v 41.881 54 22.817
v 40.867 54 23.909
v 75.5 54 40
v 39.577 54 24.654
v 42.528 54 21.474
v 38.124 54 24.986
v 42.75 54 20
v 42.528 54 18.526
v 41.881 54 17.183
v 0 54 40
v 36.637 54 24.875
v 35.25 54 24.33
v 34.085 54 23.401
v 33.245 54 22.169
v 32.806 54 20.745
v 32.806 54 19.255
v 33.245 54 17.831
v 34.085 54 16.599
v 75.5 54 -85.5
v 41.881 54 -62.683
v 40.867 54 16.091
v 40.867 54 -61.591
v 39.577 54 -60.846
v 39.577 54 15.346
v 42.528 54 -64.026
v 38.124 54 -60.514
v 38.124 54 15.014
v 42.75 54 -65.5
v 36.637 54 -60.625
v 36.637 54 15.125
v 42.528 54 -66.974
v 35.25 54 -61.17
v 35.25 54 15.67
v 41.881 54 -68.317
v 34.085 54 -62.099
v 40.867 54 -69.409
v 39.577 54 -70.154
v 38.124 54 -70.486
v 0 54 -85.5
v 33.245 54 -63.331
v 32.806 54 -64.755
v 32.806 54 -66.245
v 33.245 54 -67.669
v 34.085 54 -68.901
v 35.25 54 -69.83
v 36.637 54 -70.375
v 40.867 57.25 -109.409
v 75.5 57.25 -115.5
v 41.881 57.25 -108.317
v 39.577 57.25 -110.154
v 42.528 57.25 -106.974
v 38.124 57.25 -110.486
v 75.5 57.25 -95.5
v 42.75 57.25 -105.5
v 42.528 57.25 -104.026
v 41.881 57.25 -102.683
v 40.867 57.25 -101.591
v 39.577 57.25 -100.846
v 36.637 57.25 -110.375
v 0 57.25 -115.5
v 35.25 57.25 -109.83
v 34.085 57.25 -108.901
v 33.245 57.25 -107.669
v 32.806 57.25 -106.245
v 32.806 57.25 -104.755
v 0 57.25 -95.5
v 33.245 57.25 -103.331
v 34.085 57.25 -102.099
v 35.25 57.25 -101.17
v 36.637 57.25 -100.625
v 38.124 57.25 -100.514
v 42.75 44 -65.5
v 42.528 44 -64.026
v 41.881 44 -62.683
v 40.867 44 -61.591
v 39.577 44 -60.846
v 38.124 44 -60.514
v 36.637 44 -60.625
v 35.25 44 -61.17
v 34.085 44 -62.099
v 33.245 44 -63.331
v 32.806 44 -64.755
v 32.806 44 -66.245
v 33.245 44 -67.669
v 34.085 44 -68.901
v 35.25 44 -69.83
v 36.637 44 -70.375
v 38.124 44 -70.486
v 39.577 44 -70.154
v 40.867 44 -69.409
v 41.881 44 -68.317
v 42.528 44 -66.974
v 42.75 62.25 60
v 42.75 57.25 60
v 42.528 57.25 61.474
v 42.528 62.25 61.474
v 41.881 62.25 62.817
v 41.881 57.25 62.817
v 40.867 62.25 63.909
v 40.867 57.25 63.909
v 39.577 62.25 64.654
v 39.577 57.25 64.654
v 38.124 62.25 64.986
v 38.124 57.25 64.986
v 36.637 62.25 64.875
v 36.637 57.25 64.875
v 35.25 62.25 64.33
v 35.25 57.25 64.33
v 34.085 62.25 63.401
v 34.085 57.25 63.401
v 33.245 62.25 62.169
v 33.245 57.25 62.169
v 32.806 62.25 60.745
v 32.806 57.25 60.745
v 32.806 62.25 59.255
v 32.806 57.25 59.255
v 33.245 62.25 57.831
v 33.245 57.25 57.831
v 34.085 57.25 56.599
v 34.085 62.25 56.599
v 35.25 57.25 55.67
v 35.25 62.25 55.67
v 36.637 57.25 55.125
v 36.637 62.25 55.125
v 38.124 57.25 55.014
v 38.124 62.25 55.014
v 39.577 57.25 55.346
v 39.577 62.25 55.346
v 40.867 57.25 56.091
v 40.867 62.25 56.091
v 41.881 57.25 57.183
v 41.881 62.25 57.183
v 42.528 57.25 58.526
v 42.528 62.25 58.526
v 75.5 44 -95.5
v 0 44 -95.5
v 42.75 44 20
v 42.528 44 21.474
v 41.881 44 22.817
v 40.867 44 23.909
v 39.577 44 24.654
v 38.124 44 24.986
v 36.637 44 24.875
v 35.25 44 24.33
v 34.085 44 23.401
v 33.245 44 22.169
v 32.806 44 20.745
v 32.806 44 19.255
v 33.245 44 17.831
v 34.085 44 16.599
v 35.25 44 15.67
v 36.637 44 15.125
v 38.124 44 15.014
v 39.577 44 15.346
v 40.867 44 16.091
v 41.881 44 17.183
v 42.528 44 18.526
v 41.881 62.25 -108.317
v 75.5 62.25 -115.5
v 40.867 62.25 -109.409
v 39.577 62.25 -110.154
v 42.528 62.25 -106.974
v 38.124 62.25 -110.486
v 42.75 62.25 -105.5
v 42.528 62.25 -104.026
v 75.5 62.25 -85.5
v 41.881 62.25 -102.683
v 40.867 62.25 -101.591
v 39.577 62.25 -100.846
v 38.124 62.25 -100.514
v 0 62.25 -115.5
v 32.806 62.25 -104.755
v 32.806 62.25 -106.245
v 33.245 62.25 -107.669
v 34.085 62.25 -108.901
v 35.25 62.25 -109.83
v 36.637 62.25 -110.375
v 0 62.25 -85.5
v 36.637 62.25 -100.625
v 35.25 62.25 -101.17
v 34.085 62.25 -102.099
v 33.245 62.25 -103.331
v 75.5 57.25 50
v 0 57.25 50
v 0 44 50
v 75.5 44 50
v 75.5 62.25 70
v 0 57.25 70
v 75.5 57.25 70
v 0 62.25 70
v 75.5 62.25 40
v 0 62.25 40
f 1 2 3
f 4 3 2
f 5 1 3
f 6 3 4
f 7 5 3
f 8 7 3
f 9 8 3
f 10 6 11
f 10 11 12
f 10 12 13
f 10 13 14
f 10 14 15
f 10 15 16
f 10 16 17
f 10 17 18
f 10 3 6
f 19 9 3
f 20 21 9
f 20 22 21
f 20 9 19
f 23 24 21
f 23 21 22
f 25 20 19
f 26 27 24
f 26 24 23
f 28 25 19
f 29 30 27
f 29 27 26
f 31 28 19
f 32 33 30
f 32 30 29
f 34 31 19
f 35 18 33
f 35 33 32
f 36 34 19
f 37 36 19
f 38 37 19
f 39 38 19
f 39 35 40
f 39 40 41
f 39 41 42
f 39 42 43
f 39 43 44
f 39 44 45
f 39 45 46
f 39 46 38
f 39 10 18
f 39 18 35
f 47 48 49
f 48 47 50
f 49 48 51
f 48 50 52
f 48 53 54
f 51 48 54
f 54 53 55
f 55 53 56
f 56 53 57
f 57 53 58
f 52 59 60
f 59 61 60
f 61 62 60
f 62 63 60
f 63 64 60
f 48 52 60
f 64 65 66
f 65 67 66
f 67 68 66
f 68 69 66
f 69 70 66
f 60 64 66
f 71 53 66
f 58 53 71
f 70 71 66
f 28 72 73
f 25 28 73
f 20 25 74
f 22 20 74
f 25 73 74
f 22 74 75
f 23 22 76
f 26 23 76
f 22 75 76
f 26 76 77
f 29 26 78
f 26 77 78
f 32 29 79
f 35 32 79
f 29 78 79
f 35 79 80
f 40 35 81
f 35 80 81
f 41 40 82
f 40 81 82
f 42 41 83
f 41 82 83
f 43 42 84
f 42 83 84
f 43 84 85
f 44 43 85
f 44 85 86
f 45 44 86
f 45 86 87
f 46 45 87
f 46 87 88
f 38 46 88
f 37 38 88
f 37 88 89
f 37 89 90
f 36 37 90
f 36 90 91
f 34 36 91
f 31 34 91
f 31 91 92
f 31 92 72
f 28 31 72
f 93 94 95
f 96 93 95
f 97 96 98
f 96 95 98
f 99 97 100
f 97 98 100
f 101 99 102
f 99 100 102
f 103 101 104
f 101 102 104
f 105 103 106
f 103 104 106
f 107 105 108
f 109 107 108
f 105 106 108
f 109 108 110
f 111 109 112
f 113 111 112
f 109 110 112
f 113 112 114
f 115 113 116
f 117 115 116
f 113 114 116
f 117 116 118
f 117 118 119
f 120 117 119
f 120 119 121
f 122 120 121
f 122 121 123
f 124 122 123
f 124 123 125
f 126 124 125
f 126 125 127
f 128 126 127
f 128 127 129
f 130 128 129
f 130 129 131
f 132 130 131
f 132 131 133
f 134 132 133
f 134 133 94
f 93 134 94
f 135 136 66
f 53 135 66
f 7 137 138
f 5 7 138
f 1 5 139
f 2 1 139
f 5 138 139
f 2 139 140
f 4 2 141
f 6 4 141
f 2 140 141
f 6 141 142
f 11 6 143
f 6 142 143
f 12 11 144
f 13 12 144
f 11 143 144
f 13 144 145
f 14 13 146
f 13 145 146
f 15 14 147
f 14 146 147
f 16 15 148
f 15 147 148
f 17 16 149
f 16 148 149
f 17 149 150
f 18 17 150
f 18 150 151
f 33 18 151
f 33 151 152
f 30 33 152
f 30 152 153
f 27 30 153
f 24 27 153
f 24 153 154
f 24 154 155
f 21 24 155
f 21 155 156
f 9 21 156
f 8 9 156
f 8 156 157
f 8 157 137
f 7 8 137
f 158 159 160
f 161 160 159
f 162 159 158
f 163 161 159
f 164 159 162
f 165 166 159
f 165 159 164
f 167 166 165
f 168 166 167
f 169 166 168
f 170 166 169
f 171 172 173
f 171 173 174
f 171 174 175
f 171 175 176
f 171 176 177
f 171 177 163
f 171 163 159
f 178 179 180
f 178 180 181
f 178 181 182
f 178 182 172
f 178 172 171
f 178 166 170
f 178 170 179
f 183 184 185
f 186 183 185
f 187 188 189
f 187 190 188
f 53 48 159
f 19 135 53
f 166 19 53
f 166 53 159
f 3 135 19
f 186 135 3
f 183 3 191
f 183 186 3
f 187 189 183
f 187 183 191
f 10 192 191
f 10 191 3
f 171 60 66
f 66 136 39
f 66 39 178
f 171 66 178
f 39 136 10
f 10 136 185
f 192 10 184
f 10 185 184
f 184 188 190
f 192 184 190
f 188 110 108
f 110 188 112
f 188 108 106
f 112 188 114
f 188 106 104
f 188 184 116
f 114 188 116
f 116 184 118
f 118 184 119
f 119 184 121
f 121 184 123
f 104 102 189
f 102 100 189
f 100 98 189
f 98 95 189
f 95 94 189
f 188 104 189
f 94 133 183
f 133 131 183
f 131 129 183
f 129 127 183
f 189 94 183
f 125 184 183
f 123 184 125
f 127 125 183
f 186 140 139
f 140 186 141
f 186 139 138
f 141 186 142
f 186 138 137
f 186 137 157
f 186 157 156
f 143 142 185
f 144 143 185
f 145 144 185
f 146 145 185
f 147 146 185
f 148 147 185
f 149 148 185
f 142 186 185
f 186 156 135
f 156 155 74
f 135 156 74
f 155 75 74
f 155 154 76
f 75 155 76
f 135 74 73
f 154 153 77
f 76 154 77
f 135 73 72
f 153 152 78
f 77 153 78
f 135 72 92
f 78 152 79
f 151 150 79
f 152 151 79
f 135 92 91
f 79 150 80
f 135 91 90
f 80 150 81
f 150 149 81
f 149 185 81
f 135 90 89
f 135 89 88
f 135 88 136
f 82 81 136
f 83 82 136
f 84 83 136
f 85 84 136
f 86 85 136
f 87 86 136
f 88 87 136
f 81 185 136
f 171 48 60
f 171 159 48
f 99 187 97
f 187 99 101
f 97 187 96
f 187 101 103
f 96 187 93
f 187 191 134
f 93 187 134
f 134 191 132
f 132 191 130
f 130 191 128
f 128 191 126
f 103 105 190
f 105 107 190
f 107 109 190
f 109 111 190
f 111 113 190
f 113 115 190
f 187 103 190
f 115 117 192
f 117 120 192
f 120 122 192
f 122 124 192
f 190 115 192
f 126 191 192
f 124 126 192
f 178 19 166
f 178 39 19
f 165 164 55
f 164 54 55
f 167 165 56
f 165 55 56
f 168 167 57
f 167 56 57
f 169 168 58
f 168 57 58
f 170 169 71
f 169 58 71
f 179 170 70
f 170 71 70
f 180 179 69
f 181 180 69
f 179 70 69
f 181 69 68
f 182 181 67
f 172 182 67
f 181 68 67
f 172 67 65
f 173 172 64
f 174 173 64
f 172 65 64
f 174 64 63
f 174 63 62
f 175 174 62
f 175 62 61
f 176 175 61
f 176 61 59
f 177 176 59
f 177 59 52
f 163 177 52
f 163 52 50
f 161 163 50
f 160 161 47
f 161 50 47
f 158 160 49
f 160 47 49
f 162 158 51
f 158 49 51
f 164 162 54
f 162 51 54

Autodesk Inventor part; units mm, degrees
ref_plane "YZ Plane" through (0, 0, 0) normal (1, 0, 0) x (0, 1, 0)
ref_plane "XZ Plane" through (0, 0, 0) normal (0, 1, 0) x (-1, 0, 0)
ref_plane "XY Plane" through (0, 0, 0) normal (0, 0, 1) x (1, 0, 0)
sketch "Sketch1" plane through (0, 0, 0) normal (1, 0, 0) x (0, 1, 0)
  line L0 (-6, -12.5) -> (-6, -12.9)
  arc A0 (-6, -12.9) -> (-5.6, -13.3) centre (-5.6, -12.9) ccw
  line L1 (-5.6, -13.3) -> (-4.9, -13.3)
  arc A1 (-4.9, -13.3) -> (-4.7, -13.1) centre (-4.9, -13.1) ccw
  line L2 (-4.7, -13.1) -> (-4.7, -12.85)
  arc A2 (-4.5, -12.65) -> (-4.7, -12.85) centre (-4.5, -12.85) ccw
  line L3 (-4.5, -12.65) -> (-1.8, -12.65)
  arc A3 (-1.4, -13.05) -> (-1.8, -12.65) centre (-1.8, -13.05) ccw
  line L4 (-1.4, -13.05) -> (-1.4, -18.75)
  line L5 (-1.8, -19.15) -> (-4.5, -19.15)
  arc A4 (-1.8, -19.15) -> (-1.4, -18.75) centre (-1.8, -18.75) ccw
  arc A5 (-4.7, -18.95) -> (-4.5, -19.15) centre (-4.5, -18.95) ccw
  line L6 (-4.7, -18.95) -> (-4.7, -18.7)
  arc A6 (-4.7, -18.7) -> (-4.9, -18.5) centre (-4.9, -18.7) ccw
  line L7 (-4.9, -18.5) -> (-5.6, -18.5)
  arc A7 (-5.6, -18.5) -> (-6, -18.9) centre (-5.6, -18.9) ccw
  line L8 (-6, -18.9) -> (-6, -19.5)
  line L9 (-6.5, -6.5) -> (-6.5, -12.5)
  line L10 (-6.5, -12.5) -> (-2.5, -12.5)
  line L11 (-1.05, -19.5) -> (-6.5, -19.5)
  line L12 (-6.5, -19.5) -> (-6.5, -26)
  line L13 (-6.5, -26) -> (-1.05, -26)
  line L14 (-6, -26) -> (-6, -26.6)
  arc A8 (-6, -26.6) -> (-5.6, -27) centre (-5.6, -26.6) ccw
  line L15 (-5.6, -27) -> (-4.9, -27)
  arc A9 (-4.9, -27) -> (-4.7, -26.8) centre (-4.9, -26.8) ccw
  arc A10 (-4.5, -26.35) -> (-4.7, -26.55) centre (-4.5, -26.55) ccw
  line L16 (-4.7, -26.8) -> (-4.7, -26.55)
  line L17 (-4.5, -26.35) -> (-1.8, -26.35)
  arc A11 (-1.4, -26.75) -> (-1.8, -26.35) centre (-1.8, -26.75) ccw
  line L18 (-1.4, -26.75) -> (-1.4, -32.45)
  arc A12 (-1.8, -32.85) -> (-1.4, -32.45) centre (-1.8, -32.45) ccw
  line L19 (-1.8, -32.85) -> (-4.5, -32.85)
  arc A13 (-4.7, -32.65) -> (-4.5, -32.85) centre (-4.5, -32.65) ccw
  line L20 (-4.7, -32.65) -> (-4.7, -32.4)
  arc A14 (-4.7, -32.4) -> (-4.9, -32.2) centre (-4.9, -32.4) ccw
  line L21 (-4.9, -32.2) -> (-5.6, -32.2)
  arc A15 (-5.6, -32.2) -> (-6, -32.6) centre (-5.6, -32.6) ccw
  line L22 (-6, -32.6) -> (-6, -33)
  line L23 (-2.5, -33) -> (-6.5, -33)
  line L24 (-6.5, -33) -> (-6.5, -39)
  line L25 (32.5, 0) -> (0, 0)
  circle A16 centre (0, -6.5) radius 4.75
  circle A17 centre (32.5, -6.5) radius 4.75
  circle A18 centre (0, -39) radius 4.75
  circle A19 centre (32.5, -39) radius 4.75
  line L26 (39, -26) -> (39, -19.5)
  line L27 (39, -12.5) -> (39, -6.5)
  line L28 (39, -39) -> (39, -33)
  line L29 (26.5, -45.5) -> (32.5, -45.5)
  line L30 (0, -45.5) -> (6, -45.5)
  line L31 (13, -45.5) -> (19.5, -45.5)
  circle A20 centre (16.25, -22.75) radius 15
  circle A21 centre (16.2588, 5.0016) radius 2.5
  circle A22 centre (16.25, -50.5) radius 2.5
  circle A23 centre (16.25, -22.75) radius 5
  circle A24 centre (16.25, -22.75) radius 8.45
  line L32 (24.75, -27.6575) -> (24.75, -17.8425)
  line L33 (44, 10) -> (-11.5, 10)
  line L34 (-11.5, 10) -> (-11.5, -55.5)
  line L35 (-11.5, -55.5) -> (44, -55.5)
  line L36 (44, -55.5) -> (44, 10)
  line L37 (-11.5, 30) -> (44, 30)
  line L38 (-11.5, -75.5) -> (-11.5, 30)
  line L39 (44, 30) -> (44, -75.5)
  line L40 (44, -75.5) -> (-11.5, -75.5)
  circle A25 centre (16.25, -65.5) radius 5
  circle A26 centre (16.25, 20) radius 5
  line L41 (44, 30) -> (44, 50)
  line L42 (44, -75.5) -> (44, -95.5)
  line L43 (110, 50) -> (84, 50)
  line L44 (84, 50) -> (84, -95.5)
  line L45 (84, -95.5) -> (110, -95.5)
  line L46 (110, -95.5) -> (110, 50)
  line L47 (84, 50) -> (104, 50)
  line L48 (104, -95.5) -> (84, -95.5)
  line L49 (84, -95.5) -> (84, 50)
  line L50 (84, 50) -> (64, 50)
  line L51 (64, 50) -> (64, -95.5)
  line L52 (64, -95.5) -> (84, -95.5)
  line L53 (84, -95.5) -> (84, 50)
  line L54 (64, 50) -> (44, 50)
  line L55 (44, 50) -> (44, -95.5)
  line L56 (44, -95.5) -> (64, -95.5)
  line L57 (64, -95.5) -> (64, 50)
  line L58 (44, 30) -> (54, 30)
  line L59 (100.8097, 50) -> (100.8097, 40)
  line L60 (94, -95.5) -> (94, -85.5)
  line L61 (110, 40) -> (54, 40)
  line L62 (54, 40) -> (54, -85.5)
  line L63 (54, -85.5) -> (110, -85.5)
  line L64 (110, 50) -> (136, 50)
  line L65 (136, 50) -> (136, 40)
  line L66 (136, 40) -> (110, 40)
  line L67 (110, -85.5) -> (136, -85.5)
  line L68 (136, -85.5) -> (136, -95.5)
  line L69 (136, -95.5) -> (110, -95.5)
  dimension "d0" = 20
  dimension "d1" = 20
  dimension "d2" = 55.5
  dimension "d3" = 26
  dimension "d5" = 20
  dimension "d6" = 45.5
  dimension "d7" = 20
  dimension "d8" = 10
  dimension "d9" = 10
  dimension "d10" = 26
extrude "Extrusion1" add sketch "Sketch1" along normal blind 75.5 contours L39 L58 L62 L63 L51 L56 L42 L36 | L41 L54 L51 L61 L62 L58 | L50 L44 L61 L51 | L51 L63 L44 L52 | L43 L59 L61 L44 | L44 L63 L60 L45 | L43 L46 L61 L59 | L60 L63 L46 L45 | L64 L65 L66 L46 | L67 L68 L69 L46
sketch "Sketch2" plane through (0, 44, -95.5) normal (0, -1, 0) x (1, 0, 0)
  line L0 (15.5, 83) -> (15.5, 82.6)
  arc A0 (15.5, 82.6) -> (15.9, 82.2) centre (15.9, 82.6) ccw
  line L1 (15.9, 82.2) -> (16.6, 82.2)
  arc A1 (16.6, 82.2) -> (16.8, 82.4) centre (16.6, 82.4) ccw
  line L2 (16.8, 82.4) -> (16.8, 82.65)
  arc A2 (17, 82.85) -> (16.8, 82.65) centre (17, 82.65) ccw
  line L3 (17, 82.85) -> (19.7, 82.85)
  arc A3 (20.1, 82.45) -> (19.7, 82.85) centre (19.7, 82.45) ccw
  line L4 (20.1, 82.45) -> (20.1, 76.75)
  line L5 (19.7, 76.35) -> (17, 76.35)
  arc A4 (19.7, 76.35) -> (20.1, 76.75) centre (19.7, 76.75) ccw
  arc A5 (16.8, 76.55) -> (17, 76.35) centre (17, 76.55) ccw
  line L6 (16.8, 76.55) -> (16.8, 76.8)
  arc A6 (16.8, 76.8) -> (16.6, 77) centre (16.6, 76.8) ccw
  line L7 (16.6, 77) -> (15.9, 77)
  arc A7 (15.9, 77) -> (15.5, 76.6) centre (15.9, 76.6) ccw
  line L8 (15.5, 76.6) -> (15.5, 76)
  line L9 (15, 89) -> (15, 83)
  line L10 (15, 83) -> (19, 83)
  line L11 (20.45, 76) -> (15, 76)
  line L12 (15, 76) -> (15, 69.5)
  line L13 (15, 69.5) -> (20.45, 69.5)
  line L14 (15.5, 69.5) -> (15.5, 68.9)
  arc A8 (15.5, 68.9) -> (15.9, 68.5) centre (15.9, 68.9) ccw
  line L15 (15.9, 68.5) -> (16.6, 68.5)
  arc A9 (16.6, 68.5) -> (16.8, 68.7) centre (16.6, 68.7) ccw
  arc A10 (17, 69.15) -> (16.8, 68.95) centre (17, 68.95) ccw
  line L16 (16.8, 68.7) -> (16.8, 68.95)
  line L17 (17, 69.15) -> (19.7, 69.15)
  arc A11 (20.1, 68.75) -> (19.7, 69.15) centre (19.7, 68.75) ccw
  line L18 (20.1, 68.75) -> (20.1, 63.05)
  arc A12 (19.7, 62.65) -> (20.1, 63.05) centre (19.7, 63.05) ccw
  line L19 (19.7, 62.65) -> (17, 62.65)
  arc A13 (16.8, 62.85) -> (17, 62.65) centre (17, 62.85) ccw
  line L20 (16.8, 62.85) -> (16.8, 63.1)
  arc A14 (16.8, 63.1) -> (16.6, 63.3) centre (16.6, 63.1) ccw
  line L21 (16.6, 63.3) -> (15.9, 63.3)
  arc A15 (15.9, 63.3) -> (15.5, 62.9) centre (15.9, 62.9) ccw
  line L22 (15.5, 62.9) -> (15.5, 62.5)
  line L23 (19, 62.5) -> (15, 62.5)
  line L24 (15, 62.5) -> (15, 56.5)
  line L25 (54, 95.5) -> (21.5, 96.1203)
  circle A16 centre (21.5, 89) radius 4.75
  circle A17 centre (54, 89) radius 4.75
  circle A18 centre (21.5, 56.5) radius 4.75
  circle A19 centre (54, 56.5) radius 4.75
  line L26 (60.5, 69.5) -> (60.5, 76)
  line L27 (60.5, 83) -> (60.5, 89)
  line L28 (60.5, 56.5) -> (60.5, 62.5)
  line L29 (48, 50) -> (54, 50)
  line L30 (21.5, 50) -> (27.5, 50)
  line L31 (34.5, 50) -> (41, 50)
  circle A20 centre (37.75, 72.75) radius 15
  circle A21 centre (37.7588, 100.5016) radius 2.5
  circle A22 centre (37.75, 45) radius 2.5
  circle A23 centre (37.75, 72.75) radius 5
  circle A24 centre (37.75, 72.75) radius 8.45
  line L32 (46.25, 67.8425) -> (46.25, 77.6575)
  line L33 (65.5, 105.5) -> (10, 105.5)
  line L34 (10, 105.5) -> (10, 40)
  line L35 (10, 40) -> (65.5, 40)
  line L36 (65.5, 40) -> (65.5, 105.5)
  line L37 (10, 125.5) -> (65.5, 125.5)
  line L38 (10, 20) -> (10, 125.5)
  line L39 (65.5, 125.5) -> (65.5, 20)
  line L40 (65.5, 20) -> (10, 20)
  circle A25 centre (37.75, 30) radius 5
  circle A26 centre (37.75, 115.5) radius 5
  line L41 (0, 145.5) -> (0, 0) projected
  line L42 (75.5, 145.5) -> (75.5, 0) projected
  line L43 (0, 145.5) -> (75.5, 0)
  line L44 (75.5, 0) -> (75.5, 145.5)
  line L45 (75.5, 145.5) -> (0, 0)
  line L46 (37.75, 72.75) -> (-23.5643, 72.75)
  point P0 (0, 95.5)
extrude "Extrusion2" cut sketch "Sketch2" against normal blind 75.5 contours A25 | A26
sketch "Sketch3" plane through (0, 44, -95.5) normal (0, 0, -1) x (-1, 0, 0)
  line L0 (0, 92) -> (-75.5, 92) projected
  line L1 (-75.5, 92) -> (-10, 92)
  line L2 (-10, 92) -> (-10, 36.5)
  line L3 (-10, 36.5) -> (-75.5, 36.5)
  line L4 (-75.5, 36.5) -> (-75.5, 92)
  line L5 (-42.75, 36.5) -> (-42.75, 92)
  line L6 (-10, 36.5) -> (-42.75, 92)
  line L7 (-26.375, 64.25) -> (-42.75, 64.25)
  line L8 (-42.75, 36.5) -> (-75.5, 92)
  line L9 (-59.125, 64.25) -> (-42.75, 64.25)
  circle A0 centre (-26.375, 64.25) radius 5
  circle A1 centre (-59.125, 64.25) radius 5
  point P0 (0, -44)
  dimension "d21" = 65.5
  dimension "d22" = 55.5
  dimension "d23" = 10
  dimension "d24" = 10
extrude "Extrusion3" cut sketch "Sketch3" against normal through all contours A0 L6 | L6 L7 A0 | A0 L7 L6 | A1 L9 L8 | L8 A1 | A1 L8 L9
sketch "Sketch4" plane through (0, 44, -95.5) normal (0, 0, -1) x (-1, 0, 0)
  line L0 (0, 0) -> (-75.5, 0) projected
  line L1 (-75.5, 10) -> (-75.5, 92) projected
  line L2 (0, 0) -> (-75.5, 0)
  line L3 (-75.5, 0) -> (-75.5, 18.25)
  line L4 (-75.5, 18.25) -> (0, 18.25)
  line L5 (0, 18.25) -> (0, 0)
  line L6 (0, 92) -> (-75.5, 92) projected
  line L7 (0, 18.25) -> (-75.5, 18.25)
  line L8 (-75.5, 18.25) -> (-75.5, 92)
  line L9 (-75.5, 92) -> (0, 92)
  line L10 (0, 92) -> (0, 18.25)
  point P0 (0, -44)
  dimension "d27" = 18.25
extrude "Extrusion4" cut sketch "Sketch4" against normal through all contours L4 L1 L6 L10
sketch "Sketch5" plane through (75.5, 44, -95.5) normal (0, 0, -1) x (-1, 0, 0)
  line L0 (0, 18.25) -> (75.5, 18.25) projected
  line L1 (0, 0) -> (0, 18.25) projected
  line L2 (75.5, 18.25) -> (0, 18.25)
  line L3 (0, 18.25) -> (0, 13.25)
  line L4 (0, 13.25) -> (75.5, 13.25)
  line L5 (75.5, 13.25) -> (75.5, 18.25)
  point P0 (75.5, -44)
  dimension "d30" = 5
sketch "Sketch6" plane through (0, 44, 50) normal (0, 0, 1) x (1, 0, 0)
  line L0 (75.5, 18.25) -> (75.5, 10) projected
  line L1 (0, 18.25) -> (0, 0) projected
  line L2 (75.5, 18.25) -> (0, 18.25)
  line L3 (0, 18.25) -> (0, 13.25)
  line L4 (0, 13.25) -> (75.5, 13.25)
  line L5 (75.5, 13.25) -> (75.5, 18.25)
  point P0 (0, -44)
  dimension "d31" = 5
extrude "Extrusion5" add sketch "Sketch6" along normal blind 20
extrude "Extrusion6" add sketch "Sketch5" along normal blind 20
sketch "Sketch7" plane through (0, 57.25, -95.5) normal (0, -1, 0) x (1, 0, 0)
  line L0 (0, 10) -> (0, -20) projected
  line L1 (0, 0) -> (75.5, 0) projected
  line L2 (0, -20) -> (75.5, 0)
  line L3 (75.5, 0) -> (37.75, -10)
  line L4 (37.75, -10) -> (37.75, -2.094)
  line L5 (0, 145.5) -> (0, 165.5) projected
  line L6 (75.5, 145.5) -> (75.5, 165.5) projected
  line L7 (0, 145.5) -> (75.5, 165.5)
  line L8 (75.5, 165.5) -> (37.75, 159.321)
  line L9 (37.75, 159.321) -> (37.75, 155.5)
  circle A0 centre (37.75, -10) radius 5
  circle A1 centre (37.75, 155.5) radius 5
  point P0 (0, 95.5)
  dimension "d36" = 10
  dimension "d37" = 10
extrude "Extrusion7" cut sketch "Sketch7" against normal blind 20 contours A0 L4 L2 | L2 A0 | L2 L4 A0 | A1 L8 L9 L7 | L7 A1 | L9 L8 A1 L7
properties part number "CarroSuperior"
